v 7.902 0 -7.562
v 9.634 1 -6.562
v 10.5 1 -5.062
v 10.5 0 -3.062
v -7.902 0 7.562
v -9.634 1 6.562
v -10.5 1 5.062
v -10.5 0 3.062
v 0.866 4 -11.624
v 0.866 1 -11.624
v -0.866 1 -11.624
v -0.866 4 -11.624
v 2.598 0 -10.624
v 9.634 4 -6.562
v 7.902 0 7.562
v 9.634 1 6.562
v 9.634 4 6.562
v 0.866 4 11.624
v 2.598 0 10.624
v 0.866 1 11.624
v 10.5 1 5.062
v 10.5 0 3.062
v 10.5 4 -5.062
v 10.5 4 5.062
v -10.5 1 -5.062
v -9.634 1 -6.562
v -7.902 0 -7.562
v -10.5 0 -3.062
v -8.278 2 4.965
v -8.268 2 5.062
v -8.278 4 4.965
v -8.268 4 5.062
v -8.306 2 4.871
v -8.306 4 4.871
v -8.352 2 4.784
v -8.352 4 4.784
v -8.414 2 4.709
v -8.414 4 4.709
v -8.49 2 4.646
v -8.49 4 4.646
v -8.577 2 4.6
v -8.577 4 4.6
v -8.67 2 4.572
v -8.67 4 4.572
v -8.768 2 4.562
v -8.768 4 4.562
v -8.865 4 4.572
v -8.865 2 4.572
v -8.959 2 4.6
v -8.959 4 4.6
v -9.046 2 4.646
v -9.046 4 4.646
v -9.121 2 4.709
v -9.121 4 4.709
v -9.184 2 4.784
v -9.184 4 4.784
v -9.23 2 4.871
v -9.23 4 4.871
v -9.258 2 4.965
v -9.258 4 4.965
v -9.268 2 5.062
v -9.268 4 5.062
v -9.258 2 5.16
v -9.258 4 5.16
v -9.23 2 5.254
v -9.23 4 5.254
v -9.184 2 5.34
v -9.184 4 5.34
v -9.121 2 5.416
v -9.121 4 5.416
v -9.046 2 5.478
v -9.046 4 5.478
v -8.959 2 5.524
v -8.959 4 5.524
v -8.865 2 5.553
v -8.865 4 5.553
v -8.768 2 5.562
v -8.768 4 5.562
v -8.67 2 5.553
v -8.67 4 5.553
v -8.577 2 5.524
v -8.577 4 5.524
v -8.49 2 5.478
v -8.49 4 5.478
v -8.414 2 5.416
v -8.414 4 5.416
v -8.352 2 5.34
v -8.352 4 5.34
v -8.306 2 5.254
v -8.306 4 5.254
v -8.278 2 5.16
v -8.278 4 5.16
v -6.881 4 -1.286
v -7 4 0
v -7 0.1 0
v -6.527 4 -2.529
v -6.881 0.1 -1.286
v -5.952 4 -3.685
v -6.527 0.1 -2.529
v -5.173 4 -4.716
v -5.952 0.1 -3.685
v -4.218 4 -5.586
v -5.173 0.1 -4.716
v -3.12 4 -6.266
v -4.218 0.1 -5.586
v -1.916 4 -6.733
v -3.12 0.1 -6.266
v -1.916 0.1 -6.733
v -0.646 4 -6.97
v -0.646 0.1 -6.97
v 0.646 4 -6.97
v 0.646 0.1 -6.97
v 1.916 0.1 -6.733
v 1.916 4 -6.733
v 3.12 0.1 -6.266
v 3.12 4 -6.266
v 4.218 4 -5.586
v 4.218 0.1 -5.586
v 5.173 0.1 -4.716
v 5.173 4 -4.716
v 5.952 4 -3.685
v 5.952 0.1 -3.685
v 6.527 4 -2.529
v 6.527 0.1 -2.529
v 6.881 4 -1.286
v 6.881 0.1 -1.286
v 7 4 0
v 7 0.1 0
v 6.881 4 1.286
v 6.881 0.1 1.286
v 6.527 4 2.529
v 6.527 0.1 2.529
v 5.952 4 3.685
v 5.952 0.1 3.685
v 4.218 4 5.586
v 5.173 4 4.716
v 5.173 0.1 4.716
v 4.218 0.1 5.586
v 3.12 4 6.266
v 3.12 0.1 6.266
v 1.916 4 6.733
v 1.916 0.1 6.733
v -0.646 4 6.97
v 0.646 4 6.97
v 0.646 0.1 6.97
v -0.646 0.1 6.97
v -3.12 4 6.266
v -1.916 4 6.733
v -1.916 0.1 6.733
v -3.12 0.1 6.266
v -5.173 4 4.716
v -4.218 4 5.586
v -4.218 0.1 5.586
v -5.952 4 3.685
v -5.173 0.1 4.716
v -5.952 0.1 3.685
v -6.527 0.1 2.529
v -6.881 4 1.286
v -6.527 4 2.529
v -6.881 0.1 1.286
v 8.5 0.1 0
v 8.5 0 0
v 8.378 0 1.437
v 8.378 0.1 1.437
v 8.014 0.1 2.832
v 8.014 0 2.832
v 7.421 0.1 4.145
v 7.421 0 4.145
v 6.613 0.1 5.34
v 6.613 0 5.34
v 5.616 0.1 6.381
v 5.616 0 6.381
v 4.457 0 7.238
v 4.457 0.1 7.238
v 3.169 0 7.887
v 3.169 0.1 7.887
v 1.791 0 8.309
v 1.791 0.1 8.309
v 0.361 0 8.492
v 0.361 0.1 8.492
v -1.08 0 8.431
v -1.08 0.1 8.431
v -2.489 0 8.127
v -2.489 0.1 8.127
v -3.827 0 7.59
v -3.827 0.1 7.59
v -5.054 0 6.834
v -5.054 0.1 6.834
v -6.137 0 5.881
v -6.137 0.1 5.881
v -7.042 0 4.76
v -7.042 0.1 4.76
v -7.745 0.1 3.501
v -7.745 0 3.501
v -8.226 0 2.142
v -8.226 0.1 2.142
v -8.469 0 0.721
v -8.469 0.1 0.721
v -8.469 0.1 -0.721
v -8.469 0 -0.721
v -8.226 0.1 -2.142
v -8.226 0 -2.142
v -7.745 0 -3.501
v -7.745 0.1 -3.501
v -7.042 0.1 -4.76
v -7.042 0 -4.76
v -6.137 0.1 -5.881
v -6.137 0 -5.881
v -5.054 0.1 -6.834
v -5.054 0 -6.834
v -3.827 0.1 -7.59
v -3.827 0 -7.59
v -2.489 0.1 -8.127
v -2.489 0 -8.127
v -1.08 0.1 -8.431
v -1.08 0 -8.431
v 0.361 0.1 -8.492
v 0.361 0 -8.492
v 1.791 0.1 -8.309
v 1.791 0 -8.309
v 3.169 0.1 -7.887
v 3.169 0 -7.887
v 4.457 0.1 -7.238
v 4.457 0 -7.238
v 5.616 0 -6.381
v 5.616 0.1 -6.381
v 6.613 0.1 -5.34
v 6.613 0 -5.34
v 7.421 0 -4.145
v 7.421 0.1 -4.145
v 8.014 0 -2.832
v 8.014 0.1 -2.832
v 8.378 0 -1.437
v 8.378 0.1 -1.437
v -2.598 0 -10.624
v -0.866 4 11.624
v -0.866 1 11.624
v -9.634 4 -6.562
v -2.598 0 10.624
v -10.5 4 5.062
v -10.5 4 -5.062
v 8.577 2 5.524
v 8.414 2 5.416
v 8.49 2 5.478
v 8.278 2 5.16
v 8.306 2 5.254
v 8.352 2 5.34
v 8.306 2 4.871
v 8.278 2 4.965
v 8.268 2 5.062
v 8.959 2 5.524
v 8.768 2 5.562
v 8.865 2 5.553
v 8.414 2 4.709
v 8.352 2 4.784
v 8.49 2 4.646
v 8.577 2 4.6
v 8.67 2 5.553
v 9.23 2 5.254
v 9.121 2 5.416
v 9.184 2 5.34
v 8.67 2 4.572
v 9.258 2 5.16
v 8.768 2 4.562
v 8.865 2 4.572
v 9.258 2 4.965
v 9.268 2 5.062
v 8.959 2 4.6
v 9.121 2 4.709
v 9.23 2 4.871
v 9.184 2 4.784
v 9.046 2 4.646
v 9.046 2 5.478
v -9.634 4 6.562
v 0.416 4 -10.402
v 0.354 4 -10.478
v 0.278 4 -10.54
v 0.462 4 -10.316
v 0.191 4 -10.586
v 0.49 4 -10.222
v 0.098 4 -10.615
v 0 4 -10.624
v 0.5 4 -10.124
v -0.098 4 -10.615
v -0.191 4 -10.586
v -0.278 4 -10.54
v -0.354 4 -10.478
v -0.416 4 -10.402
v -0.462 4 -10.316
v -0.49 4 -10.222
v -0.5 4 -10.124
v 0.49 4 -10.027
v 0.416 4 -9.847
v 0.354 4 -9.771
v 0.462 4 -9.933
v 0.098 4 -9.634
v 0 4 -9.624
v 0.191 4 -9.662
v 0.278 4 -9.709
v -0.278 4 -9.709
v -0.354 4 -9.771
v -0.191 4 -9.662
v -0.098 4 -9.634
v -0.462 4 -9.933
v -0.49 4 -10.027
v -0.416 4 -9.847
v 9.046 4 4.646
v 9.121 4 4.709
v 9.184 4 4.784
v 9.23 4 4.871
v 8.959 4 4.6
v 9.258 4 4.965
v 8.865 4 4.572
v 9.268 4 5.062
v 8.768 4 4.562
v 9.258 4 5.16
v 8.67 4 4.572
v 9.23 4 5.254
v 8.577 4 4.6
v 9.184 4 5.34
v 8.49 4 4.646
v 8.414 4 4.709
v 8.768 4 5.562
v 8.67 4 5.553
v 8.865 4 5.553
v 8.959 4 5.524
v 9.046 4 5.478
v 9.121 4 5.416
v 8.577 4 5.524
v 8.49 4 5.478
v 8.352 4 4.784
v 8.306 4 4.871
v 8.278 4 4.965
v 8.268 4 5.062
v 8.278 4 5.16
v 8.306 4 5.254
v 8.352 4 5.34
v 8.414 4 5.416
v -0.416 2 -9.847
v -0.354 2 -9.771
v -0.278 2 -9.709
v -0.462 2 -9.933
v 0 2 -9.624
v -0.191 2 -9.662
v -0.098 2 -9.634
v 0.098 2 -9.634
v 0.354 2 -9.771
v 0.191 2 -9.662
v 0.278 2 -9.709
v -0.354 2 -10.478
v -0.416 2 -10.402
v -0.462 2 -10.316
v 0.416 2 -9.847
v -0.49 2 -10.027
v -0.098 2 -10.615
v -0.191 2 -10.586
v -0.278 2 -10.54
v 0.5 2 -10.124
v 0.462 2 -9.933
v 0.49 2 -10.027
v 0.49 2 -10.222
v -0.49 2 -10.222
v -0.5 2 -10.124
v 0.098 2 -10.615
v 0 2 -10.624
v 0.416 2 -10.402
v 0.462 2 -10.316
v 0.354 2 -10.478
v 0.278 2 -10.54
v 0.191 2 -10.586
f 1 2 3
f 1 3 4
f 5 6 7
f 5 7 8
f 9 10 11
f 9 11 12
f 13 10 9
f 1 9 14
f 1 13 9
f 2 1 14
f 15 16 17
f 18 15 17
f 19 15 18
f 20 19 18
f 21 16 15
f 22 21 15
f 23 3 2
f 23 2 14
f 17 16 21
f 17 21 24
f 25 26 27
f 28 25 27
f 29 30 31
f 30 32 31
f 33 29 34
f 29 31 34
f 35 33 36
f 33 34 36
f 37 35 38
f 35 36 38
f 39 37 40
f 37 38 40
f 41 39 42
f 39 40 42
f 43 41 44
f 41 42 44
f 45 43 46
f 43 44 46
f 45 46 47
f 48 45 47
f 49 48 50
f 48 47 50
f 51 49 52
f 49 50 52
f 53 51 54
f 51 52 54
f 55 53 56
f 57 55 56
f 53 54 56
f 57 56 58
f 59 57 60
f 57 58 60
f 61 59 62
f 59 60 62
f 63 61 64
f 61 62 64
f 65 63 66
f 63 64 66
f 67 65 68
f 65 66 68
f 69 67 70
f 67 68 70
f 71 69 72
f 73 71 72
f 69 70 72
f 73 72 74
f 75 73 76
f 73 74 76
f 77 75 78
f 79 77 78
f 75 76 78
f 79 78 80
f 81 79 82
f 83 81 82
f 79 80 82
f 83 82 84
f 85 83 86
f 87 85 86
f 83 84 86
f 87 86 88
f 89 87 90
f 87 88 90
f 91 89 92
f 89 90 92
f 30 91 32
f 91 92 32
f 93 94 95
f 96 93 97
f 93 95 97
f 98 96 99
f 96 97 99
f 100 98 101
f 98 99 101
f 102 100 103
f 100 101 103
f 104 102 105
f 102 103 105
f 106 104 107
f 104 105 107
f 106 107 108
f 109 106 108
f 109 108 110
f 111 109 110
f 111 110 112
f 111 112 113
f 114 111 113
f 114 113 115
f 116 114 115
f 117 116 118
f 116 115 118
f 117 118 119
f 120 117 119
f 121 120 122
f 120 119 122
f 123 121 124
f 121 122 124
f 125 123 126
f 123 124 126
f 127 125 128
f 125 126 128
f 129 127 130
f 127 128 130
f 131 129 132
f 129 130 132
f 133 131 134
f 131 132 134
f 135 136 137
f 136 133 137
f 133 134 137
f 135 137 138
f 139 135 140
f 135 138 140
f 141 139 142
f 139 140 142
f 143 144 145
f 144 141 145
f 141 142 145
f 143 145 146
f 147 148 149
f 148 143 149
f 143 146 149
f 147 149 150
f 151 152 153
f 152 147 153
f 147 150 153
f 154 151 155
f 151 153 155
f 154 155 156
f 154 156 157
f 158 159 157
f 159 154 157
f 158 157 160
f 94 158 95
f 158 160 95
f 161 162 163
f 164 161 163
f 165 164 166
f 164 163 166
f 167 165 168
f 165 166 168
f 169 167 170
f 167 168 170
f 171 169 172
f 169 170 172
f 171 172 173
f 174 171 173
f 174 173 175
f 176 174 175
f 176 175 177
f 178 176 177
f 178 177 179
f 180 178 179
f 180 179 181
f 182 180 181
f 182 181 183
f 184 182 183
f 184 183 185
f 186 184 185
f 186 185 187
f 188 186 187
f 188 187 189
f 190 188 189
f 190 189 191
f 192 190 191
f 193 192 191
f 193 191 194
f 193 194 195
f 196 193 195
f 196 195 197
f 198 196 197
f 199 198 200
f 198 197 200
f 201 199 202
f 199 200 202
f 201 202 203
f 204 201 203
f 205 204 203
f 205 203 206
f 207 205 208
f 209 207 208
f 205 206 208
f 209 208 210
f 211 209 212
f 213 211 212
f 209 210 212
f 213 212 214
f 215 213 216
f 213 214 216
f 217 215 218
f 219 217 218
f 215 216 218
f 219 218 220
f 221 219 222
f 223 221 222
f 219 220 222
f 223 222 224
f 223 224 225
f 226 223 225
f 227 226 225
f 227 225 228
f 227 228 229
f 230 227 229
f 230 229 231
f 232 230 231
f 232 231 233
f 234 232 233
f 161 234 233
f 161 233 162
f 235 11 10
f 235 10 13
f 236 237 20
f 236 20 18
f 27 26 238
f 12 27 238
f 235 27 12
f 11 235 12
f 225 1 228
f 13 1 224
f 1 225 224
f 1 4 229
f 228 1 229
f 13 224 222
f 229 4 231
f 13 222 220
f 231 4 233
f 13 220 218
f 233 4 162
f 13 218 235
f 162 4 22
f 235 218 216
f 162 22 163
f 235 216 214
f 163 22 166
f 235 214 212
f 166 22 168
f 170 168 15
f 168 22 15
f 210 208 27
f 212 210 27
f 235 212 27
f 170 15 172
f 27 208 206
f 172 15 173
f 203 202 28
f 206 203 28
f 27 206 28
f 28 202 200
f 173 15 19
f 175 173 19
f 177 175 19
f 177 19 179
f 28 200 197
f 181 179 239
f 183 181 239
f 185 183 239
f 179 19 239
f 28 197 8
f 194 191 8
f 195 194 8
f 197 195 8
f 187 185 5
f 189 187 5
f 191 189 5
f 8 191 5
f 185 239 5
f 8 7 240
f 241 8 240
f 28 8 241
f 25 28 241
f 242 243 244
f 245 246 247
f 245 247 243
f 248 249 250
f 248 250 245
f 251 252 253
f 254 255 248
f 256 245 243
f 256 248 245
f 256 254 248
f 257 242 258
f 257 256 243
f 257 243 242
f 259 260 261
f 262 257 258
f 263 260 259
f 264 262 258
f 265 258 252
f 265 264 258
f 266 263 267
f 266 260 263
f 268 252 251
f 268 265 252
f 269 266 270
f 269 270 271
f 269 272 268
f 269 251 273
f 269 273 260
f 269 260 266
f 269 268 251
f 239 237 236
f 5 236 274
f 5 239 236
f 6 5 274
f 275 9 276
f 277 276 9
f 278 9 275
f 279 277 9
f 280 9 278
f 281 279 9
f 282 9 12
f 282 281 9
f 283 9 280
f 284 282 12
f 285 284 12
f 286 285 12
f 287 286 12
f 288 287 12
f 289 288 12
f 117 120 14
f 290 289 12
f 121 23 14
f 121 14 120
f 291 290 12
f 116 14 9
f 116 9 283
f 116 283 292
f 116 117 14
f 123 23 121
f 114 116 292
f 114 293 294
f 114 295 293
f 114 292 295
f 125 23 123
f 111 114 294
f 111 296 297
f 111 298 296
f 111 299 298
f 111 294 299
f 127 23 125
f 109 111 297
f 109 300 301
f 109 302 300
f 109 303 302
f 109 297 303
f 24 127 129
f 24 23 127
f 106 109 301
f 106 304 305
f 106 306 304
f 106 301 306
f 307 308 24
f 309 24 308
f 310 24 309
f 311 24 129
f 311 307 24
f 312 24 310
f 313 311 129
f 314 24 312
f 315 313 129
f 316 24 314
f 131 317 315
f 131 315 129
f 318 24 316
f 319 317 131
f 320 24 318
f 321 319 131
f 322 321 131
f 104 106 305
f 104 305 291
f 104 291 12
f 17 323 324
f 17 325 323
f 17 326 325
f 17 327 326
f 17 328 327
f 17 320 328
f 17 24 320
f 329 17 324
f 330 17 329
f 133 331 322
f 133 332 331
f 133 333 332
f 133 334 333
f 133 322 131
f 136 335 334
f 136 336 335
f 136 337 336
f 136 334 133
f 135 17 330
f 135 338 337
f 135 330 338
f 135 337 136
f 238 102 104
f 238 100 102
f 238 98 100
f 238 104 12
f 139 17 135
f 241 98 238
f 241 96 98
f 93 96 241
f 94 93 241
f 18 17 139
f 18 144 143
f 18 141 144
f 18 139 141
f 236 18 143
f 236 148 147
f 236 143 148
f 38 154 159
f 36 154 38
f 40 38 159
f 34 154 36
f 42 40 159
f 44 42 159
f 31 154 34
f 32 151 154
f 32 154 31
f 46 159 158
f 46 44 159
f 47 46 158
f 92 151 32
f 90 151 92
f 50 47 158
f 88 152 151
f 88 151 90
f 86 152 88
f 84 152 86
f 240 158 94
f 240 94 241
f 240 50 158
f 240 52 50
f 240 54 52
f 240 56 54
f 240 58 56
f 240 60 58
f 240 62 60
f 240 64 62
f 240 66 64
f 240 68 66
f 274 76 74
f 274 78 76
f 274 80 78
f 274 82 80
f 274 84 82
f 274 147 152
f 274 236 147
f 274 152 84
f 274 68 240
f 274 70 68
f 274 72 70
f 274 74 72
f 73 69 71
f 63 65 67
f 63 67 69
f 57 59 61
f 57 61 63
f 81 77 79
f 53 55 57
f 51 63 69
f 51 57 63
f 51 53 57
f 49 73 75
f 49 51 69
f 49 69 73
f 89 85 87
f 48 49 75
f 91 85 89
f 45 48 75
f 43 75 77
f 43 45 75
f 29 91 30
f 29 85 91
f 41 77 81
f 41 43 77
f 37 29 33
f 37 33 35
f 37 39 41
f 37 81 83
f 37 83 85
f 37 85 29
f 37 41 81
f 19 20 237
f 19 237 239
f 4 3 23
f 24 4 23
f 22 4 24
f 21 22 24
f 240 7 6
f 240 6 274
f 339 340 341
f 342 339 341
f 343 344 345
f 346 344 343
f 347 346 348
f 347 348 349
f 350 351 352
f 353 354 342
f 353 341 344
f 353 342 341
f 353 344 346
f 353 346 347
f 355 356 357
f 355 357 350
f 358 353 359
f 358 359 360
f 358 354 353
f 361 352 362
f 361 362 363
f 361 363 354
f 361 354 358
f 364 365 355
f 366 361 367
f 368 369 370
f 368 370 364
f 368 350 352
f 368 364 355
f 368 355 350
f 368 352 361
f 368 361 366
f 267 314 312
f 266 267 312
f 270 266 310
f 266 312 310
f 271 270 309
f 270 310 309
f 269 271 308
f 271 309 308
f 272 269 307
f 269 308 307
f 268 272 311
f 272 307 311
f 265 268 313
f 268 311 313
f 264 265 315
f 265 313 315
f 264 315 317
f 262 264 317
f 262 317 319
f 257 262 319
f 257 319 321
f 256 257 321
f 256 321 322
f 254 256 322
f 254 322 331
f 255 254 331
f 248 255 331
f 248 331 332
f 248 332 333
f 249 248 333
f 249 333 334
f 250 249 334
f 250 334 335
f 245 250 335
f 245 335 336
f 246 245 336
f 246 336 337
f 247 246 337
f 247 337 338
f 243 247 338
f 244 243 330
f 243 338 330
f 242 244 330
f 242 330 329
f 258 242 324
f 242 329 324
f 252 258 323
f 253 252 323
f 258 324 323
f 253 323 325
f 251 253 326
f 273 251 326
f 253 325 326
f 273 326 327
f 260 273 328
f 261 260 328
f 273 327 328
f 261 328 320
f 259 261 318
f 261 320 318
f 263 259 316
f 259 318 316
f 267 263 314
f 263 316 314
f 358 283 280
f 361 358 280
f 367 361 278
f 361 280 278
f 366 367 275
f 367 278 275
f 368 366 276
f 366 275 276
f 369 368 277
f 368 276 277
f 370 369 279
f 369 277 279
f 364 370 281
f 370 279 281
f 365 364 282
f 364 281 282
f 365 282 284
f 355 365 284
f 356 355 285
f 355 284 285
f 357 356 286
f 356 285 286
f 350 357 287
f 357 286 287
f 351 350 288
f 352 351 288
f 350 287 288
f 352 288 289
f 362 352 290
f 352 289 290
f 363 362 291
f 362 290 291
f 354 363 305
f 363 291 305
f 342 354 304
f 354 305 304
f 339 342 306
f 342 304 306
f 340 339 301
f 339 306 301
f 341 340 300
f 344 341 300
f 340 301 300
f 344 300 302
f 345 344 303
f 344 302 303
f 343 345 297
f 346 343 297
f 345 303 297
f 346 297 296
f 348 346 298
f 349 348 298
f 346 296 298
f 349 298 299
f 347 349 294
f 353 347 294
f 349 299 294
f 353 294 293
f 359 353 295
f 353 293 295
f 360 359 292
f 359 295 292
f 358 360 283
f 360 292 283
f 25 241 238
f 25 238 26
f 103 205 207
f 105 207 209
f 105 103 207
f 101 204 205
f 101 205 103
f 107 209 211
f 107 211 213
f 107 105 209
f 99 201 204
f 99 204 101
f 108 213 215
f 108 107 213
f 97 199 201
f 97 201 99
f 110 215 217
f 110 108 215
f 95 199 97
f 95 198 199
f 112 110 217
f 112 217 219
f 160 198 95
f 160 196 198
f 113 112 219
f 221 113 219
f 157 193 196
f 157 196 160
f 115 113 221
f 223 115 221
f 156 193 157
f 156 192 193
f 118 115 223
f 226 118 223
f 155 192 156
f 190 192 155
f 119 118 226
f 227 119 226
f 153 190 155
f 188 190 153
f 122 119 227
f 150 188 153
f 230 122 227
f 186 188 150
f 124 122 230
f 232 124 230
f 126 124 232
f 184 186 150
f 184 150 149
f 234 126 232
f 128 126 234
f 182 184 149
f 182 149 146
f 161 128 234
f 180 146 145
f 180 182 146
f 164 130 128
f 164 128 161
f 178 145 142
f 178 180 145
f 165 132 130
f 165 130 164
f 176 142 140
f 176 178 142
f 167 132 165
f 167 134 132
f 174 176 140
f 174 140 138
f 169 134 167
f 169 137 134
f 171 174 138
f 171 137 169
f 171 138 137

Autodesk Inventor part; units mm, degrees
ref_plane "YZ Plane" through (0, 0, 0) normal (1, 0, 0) x (0, 1, 0)
ref_plane "XZ Plane" through (0, 0, 0) normal (0, 1, 0) x (-1, 0, 0)
ref_plane "XY Plane" through (0, 0, 0) normal (0, 0, 1) x (1, 0, 0)
sketch "Sketch1" plane through (0, 0, 0) normal (0, 1, 0) x (-1, 0, 0)
  line L0 (0, 0) -> (10.5, 0) construction
  line L1 (10.5, -6.0622) -> (0, -12.1244)
  line L2 (0, -12.1244) -> (-10.5, -6.0622)
  line L3 (-10.5, -6.0622) -> (-10.5, 6.0622)
  line L4 (-10.5, 6.0622) -> (0, 12.1244)
  line L5 (0, 12.1244) -> (10.5, 6.0622)
  line L6 (10.5, 6.0622) -> (10.5, -6.0622)
  circle A0 centre (0, 0) radius 7
  dimension "d0" = 10.5
  dimension "d1" = 14
extrude "Extrusion1" add sketch "Sketch1" along normal blind 4
thread "Thread1" size "M14x1.25" class "6H" standard "ANSI Metric M Profile" full length
chamfer "Chamfer1" distance 1 angle 45 6 edges at (10.5, 2, 6.0622) (10.5, 2, -6.0622) (0, 2, -12.1244) (-10.5, 2, -6.0622) (-10.5, 2, 6.0622) (0, 2, 12.1244)
chamfer "Chamfer2" distance 1 angle 45 6 edges at (-10.067, 0, -5.8122) (0, 0, -11.6244) (-10.067, 0, 5.8122) (10.067, 0, -5.8122) (10.067, 0, 5.8122) (0, 0, 11.6244)
sketch "Sketch2" plane through (0, 4, 0) normal (0, 1, 0) x (1, 0, 0)
  circle A0 centre (0, 10.1244) radius 0.5
  line L0 (-0.866, 11.6244) -> (0.866, 11.6244) projected
  circle A1 centre (-8.7679, -5.0622) radius 0.5
  circle A2 centre (8.7679, -5.0622) radius 0.5
  point P0 (0, 0)
  dimension "d12" = 1
  dimension "d13" = 1.5
  dimension "d16" = 360
extrude "Extrusion2" cut sketch "Sketch2" against normal blind 2
sketch "Sketch3" plane through (0, 0, 0) normal (0, -1, 0) x (1, 0, 0)
  circle A0 centre (0, 0) radius 8.5
  dimension "d20" = 17
extrude "Extrusion3" cut sketch "Sketch3" against normal blind 0.1
properties part number "nut"
